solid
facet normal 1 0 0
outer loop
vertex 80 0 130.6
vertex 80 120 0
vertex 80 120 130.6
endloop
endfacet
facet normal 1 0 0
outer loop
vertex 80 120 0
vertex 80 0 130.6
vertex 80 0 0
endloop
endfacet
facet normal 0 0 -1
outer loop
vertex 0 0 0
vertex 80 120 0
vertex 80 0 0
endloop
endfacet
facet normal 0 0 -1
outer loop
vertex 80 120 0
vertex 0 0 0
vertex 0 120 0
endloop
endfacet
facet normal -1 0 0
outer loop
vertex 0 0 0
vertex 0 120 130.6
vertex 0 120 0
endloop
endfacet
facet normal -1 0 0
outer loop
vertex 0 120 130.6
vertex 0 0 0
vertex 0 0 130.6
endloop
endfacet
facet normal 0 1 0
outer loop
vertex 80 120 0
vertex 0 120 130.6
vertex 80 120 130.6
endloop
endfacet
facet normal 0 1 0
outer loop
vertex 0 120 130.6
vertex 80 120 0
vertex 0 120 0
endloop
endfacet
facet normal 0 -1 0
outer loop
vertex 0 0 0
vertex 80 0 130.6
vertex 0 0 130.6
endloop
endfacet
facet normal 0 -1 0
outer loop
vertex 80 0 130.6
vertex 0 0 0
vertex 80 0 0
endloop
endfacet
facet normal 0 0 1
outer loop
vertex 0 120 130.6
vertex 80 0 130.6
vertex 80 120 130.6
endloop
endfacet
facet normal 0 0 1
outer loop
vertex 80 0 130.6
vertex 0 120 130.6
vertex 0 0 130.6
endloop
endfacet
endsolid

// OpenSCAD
// Architectural thermal visualization; dimensions are scaled.
color([0.7598,0,0.2402,0.75]) translate([0,0,0.00000]) cube([80.00000,120.00000,18.00000]);
color([0.8288,0,0.1712,0.75]) translate([0,0,18.00000]) cube([80.00000,120.00000,10.00000]);
color([0.8450,0,0.1550,0.75]) translate([0,0,28.00000]) cube([80.00000,120.00000,10.00000]);
color([0.9283,0,0.0717,0.75]) translate([0,0,38.00000]) cube([80.00000,120.00000,1.50000]);
color([1.0000,0,0.0000,0.75]) translate([0,0,39.50000]) cube([80.00000,120.00000,3.20000]);
color([0.9266,0,0.0734,0.75]) translate([0,0,42.70000]) cube([80.00000,120.00000,1.50000]);
color([0.8533,0,0.1467,0.75]) translate([0,0,44.20000]) cube([80.00000,120.00000,3.20000]);
color([0.7979,0,0.2021,0.75]) translate([0,0,47.40000]) cube([80.00000,120.00000,1.50000]);
color([0.7425,0,0.2575,0.75]) translate([0,0,48.90000]) cube([80.00000,120.00000,3.20000]);
color([0.6985,0,0.3015,0.75]) translate([0,0,52.10000]) cube([80.00000,120.00000,1.50000]);
color([0.6545,0,0.3455,0.75]) translate([0,0,53.60000]) cube([80.00000,120.00000,3.20000]);
color([0.6180,0,0.3820,0.75]) translate([0,0,56.80000]) cube([80.00000,120.00000,1.50000]);
color([0.5815,0,0.4185,0.75]) translate([0,0,58.30000]) cube([80.00000,120.00000,3.20000]);
color([0.5502,0,0.4498,0.75]) translate([0,0,61.50000]) cube([80.00000,120.00000,1.50000]);
color([0.5190,0,0.4810,0.75]) translate([0,0,63.00000]) cube([80.00000,120.00000,3.20000]);
color([0.4915,0,0.5085,0.75]) translate([0,0,66.20000]) cube([80.00000,120.00000,1.50000]);
color([0.4640,0,0.5360,0.75]) translate([0,0,67.70000]) cube([80.00000,120.00000,3.20000]);
color([0.4392,0,0.5608,0.75]) translate([0,0,70.90000]) cube([80.00000,120.00000,1.50000]);
color([0.4145,0,0.5855,0.75]) translate([0,0,72.40000]) cube([80.00000,120.00000,3.20000]);
color([0.3258,0,0.6742,0.75]) translate([0,0,75.60000]) cube([80.00000,120.00000,5.00000]);
color([0.2302,0,0.7698,0.75]) translate([0,0,80.60000]) cube([80.00000,120.00000,50.00000]);
